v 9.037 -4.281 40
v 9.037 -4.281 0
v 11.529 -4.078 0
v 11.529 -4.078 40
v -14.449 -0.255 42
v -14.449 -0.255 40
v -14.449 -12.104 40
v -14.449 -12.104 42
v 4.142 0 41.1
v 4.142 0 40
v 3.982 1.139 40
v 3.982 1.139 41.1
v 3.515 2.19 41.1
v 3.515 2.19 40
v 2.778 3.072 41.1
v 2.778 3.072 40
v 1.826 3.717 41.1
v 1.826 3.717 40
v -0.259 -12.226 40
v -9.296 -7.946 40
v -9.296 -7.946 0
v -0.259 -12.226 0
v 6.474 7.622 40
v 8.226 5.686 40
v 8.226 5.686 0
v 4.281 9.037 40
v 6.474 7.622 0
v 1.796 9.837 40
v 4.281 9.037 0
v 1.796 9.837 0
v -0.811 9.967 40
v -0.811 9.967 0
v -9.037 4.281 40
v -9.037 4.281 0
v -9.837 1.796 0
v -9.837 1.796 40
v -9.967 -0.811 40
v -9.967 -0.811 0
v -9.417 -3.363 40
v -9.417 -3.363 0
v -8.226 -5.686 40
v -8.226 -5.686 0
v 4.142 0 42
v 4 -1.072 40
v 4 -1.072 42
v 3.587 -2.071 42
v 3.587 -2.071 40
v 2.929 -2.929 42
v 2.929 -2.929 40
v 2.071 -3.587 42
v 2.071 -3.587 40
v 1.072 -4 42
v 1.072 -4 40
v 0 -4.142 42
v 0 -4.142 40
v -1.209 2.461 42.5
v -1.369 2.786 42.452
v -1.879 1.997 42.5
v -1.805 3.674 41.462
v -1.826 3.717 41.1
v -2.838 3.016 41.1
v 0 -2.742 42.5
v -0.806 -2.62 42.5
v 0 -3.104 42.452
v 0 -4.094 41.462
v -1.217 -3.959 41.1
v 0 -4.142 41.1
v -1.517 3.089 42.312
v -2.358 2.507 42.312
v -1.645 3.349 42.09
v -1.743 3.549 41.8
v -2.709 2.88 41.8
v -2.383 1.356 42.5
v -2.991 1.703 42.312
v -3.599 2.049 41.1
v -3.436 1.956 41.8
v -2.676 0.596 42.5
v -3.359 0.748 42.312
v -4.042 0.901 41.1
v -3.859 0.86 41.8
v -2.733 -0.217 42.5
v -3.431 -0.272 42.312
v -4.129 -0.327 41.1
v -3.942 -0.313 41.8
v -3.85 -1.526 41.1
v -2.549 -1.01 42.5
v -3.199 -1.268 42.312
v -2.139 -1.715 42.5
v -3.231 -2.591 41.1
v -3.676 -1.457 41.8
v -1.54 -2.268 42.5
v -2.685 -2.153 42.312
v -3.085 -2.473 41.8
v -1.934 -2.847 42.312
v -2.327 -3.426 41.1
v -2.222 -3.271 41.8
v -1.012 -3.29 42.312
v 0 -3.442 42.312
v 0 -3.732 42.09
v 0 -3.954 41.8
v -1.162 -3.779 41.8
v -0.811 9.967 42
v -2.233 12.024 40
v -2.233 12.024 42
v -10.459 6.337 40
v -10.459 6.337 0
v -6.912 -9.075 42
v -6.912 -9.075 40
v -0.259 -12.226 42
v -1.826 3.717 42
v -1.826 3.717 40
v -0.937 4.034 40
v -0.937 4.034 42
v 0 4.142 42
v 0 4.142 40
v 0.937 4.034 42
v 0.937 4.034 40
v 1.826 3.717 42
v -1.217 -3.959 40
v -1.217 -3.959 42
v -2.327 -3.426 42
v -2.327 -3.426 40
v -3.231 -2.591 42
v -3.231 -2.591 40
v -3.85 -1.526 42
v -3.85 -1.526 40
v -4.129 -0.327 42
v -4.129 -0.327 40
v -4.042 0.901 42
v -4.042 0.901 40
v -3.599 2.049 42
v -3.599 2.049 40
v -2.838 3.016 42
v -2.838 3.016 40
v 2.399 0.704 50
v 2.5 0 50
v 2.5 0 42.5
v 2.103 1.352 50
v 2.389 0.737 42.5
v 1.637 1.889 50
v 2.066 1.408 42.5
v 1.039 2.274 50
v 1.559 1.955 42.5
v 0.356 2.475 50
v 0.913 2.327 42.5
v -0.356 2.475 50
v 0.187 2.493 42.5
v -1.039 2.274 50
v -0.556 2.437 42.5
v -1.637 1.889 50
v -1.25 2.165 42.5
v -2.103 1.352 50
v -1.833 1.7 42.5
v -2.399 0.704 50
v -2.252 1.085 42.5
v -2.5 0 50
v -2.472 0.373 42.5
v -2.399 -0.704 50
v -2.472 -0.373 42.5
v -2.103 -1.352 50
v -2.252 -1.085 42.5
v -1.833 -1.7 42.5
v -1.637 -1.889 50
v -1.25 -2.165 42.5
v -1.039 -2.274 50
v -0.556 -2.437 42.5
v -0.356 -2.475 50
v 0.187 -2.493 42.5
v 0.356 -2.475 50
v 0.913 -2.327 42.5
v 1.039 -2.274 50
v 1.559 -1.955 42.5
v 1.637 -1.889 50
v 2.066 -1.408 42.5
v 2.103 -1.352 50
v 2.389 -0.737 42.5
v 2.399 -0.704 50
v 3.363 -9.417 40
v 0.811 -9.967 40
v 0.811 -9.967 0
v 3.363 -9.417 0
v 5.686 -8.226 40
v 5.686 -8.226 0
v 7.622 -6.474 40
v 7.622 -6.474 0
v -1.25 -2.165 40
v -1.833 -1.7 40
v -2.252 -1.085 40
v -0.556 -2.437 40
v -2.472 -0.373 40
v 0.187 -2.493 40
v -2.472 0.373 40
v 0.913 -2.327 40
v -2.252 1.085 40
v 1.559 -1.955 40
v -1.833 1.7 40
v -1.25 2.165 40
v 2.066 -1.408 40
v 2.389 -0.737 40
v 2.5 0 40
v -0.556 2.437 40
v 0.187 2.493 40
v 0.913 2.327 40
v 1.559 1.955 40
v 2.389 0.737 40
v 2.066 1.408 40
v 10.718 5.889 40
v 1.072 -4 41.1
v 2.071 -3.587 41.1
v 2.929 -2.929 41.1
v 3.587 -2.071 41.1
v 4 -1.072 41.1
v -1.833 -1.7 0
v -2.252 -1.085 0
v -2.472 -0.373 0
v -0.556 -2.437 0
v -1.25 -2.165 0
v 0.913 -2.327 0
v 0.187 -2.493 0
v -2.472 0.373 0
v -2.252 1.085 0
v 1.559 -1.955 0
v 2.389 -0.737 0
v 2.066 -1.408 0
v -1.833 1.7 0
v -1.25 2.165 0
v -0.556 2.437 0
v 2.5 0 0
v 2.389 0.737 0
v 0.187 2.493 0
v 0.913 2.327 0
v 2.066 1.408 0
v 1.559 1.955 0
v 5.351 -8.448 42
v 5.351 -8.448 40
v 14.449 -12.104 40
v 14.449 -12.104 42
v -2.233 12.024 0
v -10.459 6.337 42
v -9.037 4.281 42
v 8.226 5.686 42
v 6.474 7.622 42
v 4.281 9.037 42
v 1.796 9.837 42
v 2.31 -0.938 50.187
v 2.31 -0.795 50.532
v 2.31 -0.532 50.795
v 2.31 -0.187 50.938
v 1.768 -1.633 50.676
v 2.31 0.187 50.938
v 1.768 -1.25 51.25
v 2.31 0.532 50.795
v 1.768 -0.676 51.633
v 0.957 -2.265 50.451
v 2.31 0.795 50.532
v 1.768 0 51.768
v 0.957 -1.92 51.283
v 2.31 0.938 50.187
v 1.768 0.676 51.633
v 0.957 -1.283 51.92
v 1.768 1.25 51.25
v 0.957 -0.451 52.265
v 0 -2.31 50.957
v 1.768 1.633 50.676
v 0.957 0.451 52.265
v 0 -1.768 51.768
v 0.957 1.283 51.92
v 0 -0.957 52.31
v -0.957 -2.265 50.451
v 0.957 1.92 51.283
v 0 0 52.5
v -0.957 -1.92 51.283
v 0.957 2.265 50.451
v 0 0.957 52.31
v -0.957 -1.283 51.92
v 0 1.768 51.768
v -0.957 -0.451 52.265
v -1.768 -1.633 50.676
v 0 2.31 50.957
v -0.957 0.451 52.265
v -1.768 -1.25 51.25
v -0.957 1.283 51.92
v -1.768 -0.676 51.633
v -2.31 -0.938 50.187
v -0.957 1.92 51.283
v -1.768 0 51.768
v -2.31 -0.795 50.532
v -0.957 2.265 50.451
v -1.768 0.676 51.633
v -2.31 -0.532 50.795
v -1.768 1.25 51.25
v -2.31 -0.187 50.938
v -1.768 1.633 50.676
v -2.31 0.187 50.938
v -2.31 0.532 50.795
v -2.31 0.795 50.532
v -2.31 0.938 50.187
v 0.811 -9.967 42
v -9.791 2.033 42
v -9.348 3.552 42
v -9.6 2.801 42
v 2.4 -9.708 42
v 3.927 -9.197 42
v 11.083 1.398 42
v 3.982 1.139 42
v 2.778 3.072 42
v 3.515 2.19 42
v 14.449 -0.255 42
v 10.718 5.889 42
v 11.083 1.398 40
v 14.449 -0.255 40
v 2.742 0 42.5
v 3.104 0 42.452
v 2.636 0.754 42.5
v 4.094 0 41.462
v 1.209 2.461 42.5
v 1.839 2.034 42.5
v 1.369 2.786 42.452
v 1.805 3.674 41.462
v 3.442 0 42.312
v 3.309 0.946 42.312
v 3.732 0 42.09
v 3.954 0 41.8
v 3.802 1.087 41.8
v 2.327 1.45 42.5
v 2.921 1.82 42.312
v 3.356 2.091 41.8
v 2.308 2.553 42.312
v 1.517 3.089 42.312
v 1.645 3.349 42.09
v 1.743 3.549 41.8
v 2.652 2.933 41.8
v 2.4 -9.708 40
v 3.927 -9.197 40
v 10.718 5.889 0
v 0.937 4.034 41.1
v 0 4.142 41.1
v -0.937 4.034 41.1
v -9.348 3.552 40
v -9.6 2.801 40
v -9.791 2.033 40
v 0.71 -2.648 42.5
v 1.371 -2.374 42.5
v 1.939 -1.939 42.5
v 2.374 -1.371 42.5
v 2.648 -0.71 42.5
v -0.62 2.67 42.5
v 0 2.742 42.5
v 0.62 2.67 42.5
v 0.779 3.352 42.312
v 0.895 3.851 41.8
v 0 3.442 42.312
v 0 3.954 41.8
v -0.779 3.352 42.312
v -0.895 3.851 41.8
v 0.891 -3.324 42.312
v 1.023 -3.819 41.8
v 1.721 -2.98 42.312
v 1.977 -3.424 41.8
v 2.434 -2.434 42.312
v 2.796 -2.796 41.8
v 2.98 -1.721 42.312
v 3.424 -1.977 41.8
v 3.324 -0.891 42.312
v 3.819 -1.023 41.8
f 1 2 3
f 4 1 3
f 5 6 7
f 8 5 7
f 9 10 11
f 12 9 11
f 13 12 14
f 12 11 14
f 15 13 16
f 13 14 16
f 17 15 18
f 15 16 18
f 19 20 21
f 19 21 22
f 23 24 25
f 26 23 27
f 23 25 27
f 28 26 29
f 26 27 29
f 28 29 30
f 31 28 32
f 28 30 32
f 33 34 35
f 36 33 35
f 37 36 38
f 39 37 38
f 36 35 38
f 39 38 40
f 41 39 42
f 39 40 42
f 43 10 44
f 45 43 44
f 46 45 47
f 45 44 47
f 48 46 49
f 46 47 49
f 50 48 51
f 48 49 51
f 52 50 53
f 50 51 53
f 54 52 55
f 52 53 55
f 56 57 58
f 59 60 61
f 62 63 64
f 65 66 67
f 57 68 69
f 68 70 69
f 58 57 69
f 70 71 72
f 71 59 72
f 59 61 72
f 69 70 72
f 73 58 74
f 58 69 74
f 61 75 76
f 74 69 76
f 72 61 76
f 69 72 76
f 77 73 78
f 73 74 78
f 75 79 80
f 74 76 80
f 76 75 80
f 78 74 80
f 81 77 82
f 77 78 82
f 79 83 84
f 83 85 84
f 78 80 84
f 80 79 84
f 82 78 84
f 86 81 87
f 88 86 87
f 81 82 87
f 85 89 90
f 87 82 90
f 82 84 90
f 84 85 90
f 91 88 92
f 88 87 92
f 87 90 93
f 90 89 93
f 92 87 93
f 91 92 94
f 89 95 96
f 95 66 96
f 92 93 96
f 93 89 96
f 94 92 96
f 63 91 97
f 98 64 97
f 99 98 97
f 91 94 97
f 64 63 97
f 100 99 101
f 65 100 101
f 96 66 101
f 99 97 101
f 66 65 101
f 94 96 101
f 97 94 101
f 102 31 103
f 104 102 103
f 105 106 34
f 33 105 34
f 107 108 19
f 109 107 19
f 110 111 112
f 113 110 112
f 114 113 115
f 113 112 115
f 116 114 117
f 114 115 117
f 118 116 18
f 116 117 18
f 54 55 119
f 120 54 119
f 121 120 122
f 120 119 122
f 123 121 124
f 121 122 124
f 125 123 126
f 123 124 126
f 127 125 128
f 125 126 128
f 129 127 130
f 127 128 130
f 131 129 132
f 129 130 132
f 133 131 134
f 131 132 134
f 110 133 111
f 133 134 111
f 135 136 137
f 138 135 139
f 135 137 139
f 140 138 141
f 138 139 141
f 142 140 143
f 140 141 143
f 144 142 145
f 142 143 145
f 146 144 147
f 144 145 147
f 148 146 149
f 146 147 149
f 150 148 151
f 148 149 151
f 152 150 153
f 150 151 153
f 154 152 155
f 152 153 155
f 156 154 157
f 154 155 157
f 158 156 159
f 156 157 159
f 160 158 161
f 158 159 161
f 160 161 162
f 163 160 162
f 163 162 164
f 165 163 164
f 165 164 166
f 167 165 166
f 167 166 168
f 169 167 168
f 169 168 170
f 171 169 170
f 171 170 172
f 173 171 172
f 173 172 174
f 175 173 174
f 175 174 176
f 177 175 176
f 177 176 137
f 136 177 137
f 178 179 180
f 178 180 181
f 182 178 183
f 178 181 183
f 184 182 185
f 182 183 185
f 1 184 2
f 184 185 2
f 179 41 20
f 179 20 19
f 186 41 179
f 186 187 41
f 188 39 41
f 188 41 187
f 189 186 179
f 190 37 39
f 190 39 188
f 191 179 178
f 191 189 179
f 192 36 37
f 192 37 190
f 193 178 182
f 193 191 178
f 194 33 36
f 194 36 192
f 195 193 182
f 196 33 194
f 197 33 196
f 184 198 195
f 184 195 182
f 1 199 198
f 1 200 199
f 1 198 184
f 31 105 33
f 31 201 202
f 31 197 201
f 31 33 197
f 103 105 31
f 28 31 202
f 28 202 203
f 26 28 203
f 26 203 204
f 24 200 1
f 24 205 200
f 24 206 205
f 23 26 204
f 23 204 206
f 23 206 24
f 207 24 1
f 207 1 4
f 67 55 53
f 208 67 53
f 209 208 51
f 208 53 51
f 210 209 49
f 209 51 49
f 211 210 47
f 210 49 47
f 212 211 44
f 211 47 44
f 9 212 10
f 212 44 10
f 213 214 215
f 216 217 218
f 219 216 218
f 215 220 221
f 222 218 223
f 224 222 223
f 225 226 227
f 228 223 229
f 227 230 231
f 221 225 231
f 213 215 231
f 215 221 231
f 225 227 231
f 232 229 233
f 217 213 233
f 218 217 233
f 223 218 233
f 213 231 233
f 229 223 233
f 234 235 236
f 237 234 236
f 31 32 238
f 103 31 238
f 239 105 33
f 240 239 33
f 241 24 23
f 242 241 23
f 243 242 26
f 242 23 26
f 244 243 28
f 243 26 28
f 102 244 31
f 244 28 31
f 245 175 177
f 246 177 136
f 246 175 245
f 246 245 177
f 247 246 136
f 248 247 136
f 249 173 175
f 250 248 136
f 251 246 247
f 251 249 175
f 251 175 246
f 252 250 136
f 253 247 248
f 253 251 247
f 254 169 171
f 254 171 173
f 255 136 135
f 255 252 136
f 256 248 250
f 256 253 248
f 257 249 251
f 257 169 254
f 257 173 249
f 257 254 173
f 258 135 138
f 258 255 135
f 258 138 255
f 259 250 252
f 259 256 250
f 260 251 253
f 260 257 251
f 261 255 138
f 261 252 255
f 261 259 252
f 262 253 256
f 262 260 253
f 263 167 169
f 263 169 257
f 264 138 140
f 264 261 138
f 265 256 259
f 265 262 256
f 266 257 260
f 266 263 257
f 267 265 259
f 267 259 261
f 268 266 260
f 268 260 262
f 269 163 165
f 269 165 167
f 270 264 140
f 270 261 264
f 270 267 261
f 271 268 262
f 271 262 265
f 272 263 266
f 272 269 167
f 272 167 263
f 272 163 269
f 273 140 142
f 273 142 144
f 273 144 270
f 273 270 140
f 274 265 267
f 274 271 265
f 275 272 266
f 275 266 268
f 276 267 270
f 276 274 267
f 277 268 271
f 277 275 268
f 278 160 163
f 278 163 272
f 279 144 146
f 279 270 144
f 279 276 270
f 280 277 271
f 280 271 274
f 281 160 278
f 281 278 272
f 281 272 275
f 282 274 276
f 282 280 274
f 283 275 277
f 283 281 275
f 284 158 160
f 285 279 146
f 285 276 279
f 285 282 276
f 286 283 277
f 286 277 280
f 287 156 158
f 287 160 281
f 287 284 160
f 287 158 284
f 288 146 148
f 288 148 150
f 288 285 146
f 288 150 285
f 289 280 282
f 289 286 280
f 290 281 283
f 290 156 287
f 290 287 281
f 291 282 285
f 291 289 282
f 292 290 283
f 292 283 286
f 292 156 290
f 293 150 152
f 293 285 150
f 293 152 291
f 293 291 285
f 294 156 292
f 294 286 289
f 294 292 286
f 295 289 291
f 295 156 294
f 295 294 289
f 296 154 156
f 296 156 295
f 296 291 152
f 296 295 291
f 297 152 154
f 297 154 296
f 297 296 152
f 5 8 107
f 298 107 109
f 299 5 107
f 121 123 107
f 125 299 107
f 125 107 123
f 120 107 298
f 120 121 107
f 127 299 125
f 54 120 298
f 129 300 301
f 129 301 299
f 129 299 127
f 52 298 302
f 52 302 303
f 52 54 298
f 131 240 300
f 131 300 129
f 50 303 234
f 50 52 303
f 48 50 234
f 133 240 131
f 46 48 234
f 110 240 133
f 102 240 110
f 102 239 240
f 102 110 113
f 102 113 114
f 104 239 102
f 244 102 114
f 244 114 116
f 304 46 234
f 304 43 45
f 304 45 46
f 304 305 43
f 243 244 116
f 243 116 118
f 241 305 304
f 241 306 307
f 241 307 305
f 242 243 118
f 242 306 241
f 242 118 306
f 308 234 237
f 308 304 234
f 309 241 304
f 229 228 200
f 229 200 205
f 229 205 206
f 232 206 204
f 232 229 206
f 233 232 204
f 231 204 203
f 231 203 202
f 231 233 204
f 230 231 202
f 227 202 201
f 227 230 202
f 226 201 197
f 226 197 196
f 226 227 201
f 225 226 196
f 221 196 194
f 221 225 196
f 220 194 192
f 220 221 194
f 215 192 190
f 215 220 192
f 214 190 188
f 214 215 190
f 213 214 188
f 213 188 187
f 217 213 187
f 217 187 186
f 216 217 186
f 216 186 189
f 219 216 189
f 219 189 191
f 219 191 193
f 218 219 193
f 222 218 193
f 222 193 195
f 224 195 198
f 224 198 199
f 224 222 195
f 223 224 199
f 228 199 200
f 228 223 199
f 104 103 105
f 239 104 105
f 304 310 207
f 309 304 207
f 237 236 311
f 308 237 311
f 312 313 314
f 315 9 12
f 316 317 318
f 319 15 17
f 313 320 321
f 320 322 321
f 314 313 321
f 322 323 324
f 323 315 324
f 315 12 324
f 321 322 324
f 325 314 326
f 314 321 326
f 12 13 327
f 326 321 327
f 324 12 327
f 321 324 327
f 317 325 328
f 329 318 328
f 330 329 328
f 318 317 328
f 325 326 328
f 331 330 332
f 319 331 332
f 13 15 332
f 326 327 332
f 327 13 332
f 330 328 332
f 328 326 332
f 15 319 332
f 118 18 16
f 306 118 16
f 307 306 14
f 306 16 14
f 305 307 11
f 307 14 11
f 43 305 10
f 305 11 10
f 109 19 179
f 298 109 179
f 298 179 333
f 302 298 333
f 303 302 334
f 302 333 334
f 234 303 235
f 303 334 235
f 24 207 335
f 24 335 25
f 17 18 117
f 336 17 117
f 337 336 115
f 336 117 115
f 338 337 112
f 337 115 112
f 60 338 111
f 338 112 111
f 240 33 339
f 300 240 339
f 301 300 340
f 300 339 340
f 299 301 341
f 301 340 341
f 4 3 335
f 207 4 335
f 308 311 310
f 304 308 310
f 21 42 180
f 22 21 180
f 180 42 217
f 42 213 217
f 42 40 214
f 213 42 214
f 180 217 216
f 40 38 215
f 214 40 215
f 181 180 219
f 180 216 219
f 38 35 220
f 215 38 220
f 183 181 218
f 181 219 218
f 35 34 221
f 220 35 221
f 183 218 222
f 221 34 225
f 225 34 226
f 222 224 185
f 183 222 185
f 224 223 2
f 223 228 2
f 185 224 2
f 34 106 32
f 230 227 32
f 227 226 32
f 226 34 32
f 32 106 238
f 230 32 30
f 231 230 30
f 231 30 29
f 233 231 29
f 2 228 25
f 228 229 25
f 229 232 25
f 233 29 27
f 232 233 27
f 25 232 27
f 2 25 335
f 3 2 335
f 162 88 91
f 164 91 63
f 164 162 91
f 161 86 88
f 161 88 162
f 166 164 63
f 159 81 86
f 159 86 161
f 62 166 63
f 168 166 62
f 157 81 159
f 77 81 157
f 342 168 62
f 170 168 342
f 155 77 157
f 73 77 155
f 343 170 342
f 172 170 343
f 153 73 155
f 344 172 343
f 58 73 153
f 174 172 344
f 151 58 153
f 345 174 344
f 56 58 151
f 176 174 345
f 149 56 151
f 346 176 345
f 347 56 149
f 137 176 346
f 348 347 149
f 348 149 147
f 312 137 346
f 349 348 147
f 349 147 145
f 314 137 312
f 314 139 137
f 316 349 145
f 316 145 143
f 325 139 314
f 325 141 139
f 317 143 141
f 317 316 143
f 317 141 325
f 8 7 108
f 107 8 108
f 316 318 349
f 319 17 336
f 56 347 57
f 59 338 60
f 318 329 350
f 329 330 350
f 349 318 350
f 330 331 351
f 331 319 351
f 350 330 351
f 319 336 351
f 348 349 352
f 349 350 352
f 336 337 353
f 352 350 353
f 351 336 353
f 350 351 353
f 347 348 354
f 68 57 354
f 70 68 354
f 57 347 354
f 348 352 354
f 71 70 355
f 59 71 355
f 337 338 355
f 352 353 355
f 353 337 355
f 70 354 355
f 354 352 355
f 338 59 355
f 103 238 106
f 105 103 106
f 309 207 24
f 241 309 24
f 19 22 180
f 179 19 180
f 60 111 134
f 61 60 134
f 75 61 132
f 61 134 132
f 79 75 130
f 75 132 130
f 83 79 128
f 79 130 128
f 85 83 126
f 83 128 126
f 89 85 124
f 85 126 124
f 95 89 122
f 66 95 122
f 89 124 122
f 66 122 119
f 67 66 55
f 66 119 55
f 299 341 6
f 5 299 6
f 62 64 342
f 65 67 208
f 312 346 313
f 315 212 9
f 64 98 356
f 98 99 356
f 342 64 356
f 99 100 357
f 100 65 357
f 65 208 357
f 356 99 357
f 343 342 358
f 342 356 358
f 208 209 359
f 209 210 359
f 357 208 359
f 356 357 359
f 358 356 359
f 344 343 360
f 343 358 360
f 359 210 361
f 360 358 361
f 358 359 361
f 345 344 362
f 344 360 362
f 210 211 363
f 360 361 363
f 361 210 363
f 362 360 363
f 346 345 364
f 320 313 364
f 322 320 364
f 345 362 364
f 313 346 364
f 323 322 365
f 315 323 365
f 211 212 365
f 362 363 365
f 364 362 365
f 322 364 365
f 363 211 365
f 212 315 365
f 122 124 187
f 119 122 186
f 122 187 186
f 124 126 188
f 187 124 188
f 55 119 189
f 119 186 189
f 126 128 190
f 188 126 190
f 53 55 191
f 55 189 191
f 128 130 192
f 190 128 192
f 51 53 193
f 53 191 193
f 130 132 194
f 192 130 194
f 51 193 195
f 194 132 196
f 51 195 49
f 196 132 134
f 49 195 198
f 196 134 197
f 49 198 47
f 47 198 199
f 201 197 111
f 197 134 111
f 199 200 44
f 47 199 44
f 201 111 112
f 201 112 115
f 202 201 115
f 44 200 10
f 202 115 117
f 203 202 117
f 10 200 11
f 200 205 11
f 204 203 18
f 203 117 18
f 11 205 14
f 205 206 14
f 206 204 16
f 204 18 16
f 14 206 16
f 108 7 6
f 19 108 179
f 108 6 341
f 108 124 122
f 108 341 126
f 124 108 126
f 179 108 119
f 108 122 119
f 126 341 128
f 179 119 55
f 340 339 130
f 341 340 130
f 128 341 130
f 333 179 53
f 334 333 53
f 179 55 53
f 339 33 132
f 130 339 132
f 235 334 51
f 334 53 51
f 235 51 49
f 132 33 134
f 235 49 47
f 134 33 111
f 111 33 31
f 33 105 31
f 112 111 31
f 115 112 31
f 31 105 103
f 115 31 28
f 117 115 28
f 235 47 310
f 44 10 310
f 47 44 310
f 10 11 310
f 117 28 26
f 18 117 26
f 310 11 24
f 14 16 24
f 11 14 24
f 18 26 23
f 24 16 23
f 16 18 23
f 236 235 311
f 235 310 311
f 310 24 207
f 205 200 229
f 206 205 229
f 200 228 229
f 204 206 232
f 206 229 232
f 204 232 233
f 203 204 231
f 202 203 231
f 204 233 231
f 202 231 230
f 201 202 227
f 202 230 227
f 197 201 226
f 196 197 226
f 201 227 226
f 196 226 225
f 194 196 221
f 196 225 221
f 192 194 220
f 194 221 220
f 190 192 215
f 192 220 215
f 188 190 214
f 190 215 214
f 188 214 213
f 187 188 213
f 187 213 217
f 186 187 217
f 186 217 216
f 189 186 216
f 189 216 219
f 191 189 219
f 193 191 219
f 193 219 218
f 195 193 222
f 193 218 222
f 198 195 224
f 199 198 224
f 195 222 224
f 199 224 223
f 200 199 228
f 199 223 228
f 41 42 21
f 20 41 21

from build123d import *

# Parameters (mm, degrees)
F0_R     = 2.5
F1_DEPTH = 40
F2_DEPTH = 40
F3_R     = 2.5
F4_DEPTH = 10
F5_DEPTH = 2.5
F8_R     = 1.4
F9_DEPTH = 2


with BuildPart() as f1:
    # F0 (on Top) → F1 (new body)
    with BuildSketch(Plane.XY):
        with BuildLine():
            ThreePointArc((9.0374170739, -4.2807817782), (9.7563869014, -2.1938355979), (10, 0))
            ThreePointArc((10, 0), (9.5461967047, 2.9782760912), (8.2259743049, 5.6862418815))
            ThreePointArc((8.2259743049, 5.6862418815), (4.2807817782, 9.0374170739), (-0.8114427689, 9.9670236597))
            Line((-0.8114427689, 9.9670236597), (-9.0374170739, 4.2807817782))
            ThreePointArc((-9.0374170739, 4.2807817782), (-9.9670236597, -0.8114427689), (-8.2259743049, -5.6862418815))
            ThreePointArc((-8.2259743049, -5.6862418815), (-4.2807817782, -9.0374170739), (0.8114427689, -9.9670236597))
            ThreePointArc((0.8114427689, -9.9670236597), (5.6862418815, -8.2259743049), (9.0374170739, -4.2807817782))
        make_face()
        Circle(F0_R, mode=Mode.SUBTRACT)
        with BuildLine():
            ThreePointArc((8.2259743049, 5.6862418815), (9.5461967047, 2.9782760912), (10, 0))
            ThreePointArc((10, 0), (9.7563869014, -2.1938355979), (9.0374170739, -4.2807817782))
            Line((9.0374170739, -4.2807817782), (11.5291729888, -4.077921086))
            Line((11.5291729888, -4.077921086), (10.7177302199, 5.8891025737))
            Line((10.7177302199, 5.8891025737), (8.2259743049, 5.6862418815))
        make_face()
        with BuildLine():
            Line((-9.0374170739, 4.2807817782), (-0.8114427689, 9.9670236597))
            ThreePointArc((-0.8114427689, 9.9670236597), (-5.6862418815, 8.2259743049), (-9.0374170739, 4.2807817782))
        make_face()
        with BuildLine():
            ThreePointArc((-9.0374170739, 4.2807817782), (-5.6862418815, 8.2259743049), (-0.8114427689, 9.9670236597))
            Line((-0.8114427689, 9.9670236597), (-2.2330032393, 12.0235172359))
            Line((-2.2330032393, 12.0235172359), (-10.4589775442, 6.3372753545))
            Line((-10.4589775442, 6.3372753545), (-9.0374170739, 4.2807817782))
        make_face()
        with BuildLine():
            Line((-0.2587526756, -12.2263779282), (0.8114427689, -9.9670236597))
            ThreePointArc((0.8114427689, -9.9670236597), (-4.2807817782, -9.0374170739), (-8.2259743049, -5.6862418815))
            Line((-8.2259743049, -5.6862418815), (-9.2961697495, -7.9455961499))
            Line((-9.2961697495, -7.9455961499), (-0.2587526756, -12.2263779282))
        make_face()
    extrude(amount=F1_DEPTH)


with BuildPart() as f2:
    # F0 (on Top) → F2 (new body)
    with BuildSketch(Plane.XY):
        Circle(F0_R)
    extrude(amount=F2_DEPTH)

    # F3 (on face) → F4 (join)
    with BuildSketch(Plane.XY.offset(40)):
        Circle(F3_R)
    extrude(amount=F4_DEPTH)

    # F3 (on face) → F5 (join)
    with BuildSketch(Plane.XY.offset(40)):
        with BuildLine():
            ThreePointArc((1.8260342345, 3.7172857004), (-2.93e-08, 4.1415714414), (-1.8260342871, 3.7172856746))
            ThreePointArc((-1.8260342871, 3.7172856746), (-4.0341057369, -0.9373392702), (0, -4.1415714414))
            ThreePointArc((0, -4.1415714414), (2.928533251, -2.928533251), (4.1415714414, 0))
            ThreePointArc((4.1415714414, 0), (3.5153424613, 2.1897445933), (1.8260342345, 3.7172857004))
        make_face()
        Circle(F3_R, mode=Mode.SUBTRACT)
    extrude(amount=F5_DEPTH)

    # F6 (on Front) → F7 (revolve)
    with BuildSketch(Plane.XZ):
        with BuildLine():
            Line((-2.5, 50), (2.5, 50))
            ThreePointArc((2.5, 50), (0, 52.5), (-2.5, 50))
        make_face()
    revolve(axis=Axis((0, 0, 50), (-1, 0, 0)))

    # F8
    f8_edges = [f2.edges().sort_by_distance(p)[0] for p in [
        (1.826034, -3.717286, 42.5),
    ]]
    fillet(f8_edges, radius=F8_R)


with BuildPart() as f9:
    # F3 (on face) → F9 (new body)
    with BuildSketch(Plane.XY.offset(40)):
        with BuildLine():
            Line((11.2723216959, -0.9229938236), (1.8260342345, 3.7172857004))
            ThreePointArc((1.8260342345, 3.7172857004), (3.5153424613, 2.1897445933), (4.1415714414, 0))
            ThreePointArc((4.1415714414, 0), (2.928533251, -2.928533251), (0, -4.1415714414))
            Line((0, -4.1415714414), (7.1333343578, -7.008248065))
            ThreePointArc((7.1333343578, -7.008248065), (8.1995773399, -5.7242406874), (9.0374170739, -4.2807817782))
            Line((9.0374170739, -4.2807817782), (11.5291729888, -4.077921086))
            Line((11.5291729888, -4.077921086), (11.2723216959, -0.9229938236))
        make_face()
        with BuildLine():
            Line((1.8260342345, 3.7172857004), (0, 4.6142845799))
            Line((0, 4.6142845799), (-1.8260342871, 3.7172856746))
            ThreePointArc((-1.8260342871, 3.7172856746), (-2.93e-08, 4.1415714414), (1.8260342345, 3.7172857004))
        make_face()
        with BuildLine():
            ThreePointArc((-8.2259743049, -5.6862418815), (-9.5010919758, -3.1191747736), (-9.9956228645, -0.2958437956))
            Line((-9.9956228645, -0.2958437956), (-14.4493776544, -2.4836522061))
            Line((-14.4493776544, -2.4836522061), (-14.4493776544, -9.9483500207))
            Line((-14.4493776544, -9.9483500207), (-9.2562886562, -7.861400764))
            Line((-9.2562886562, -7.861400764), (-8.2259743049, -5.6862418815))
        make_face()
        with BuildLine():
            ThreePointArc((0, -4.1415714414), (-4.0341057369, -0.9373392702), (-1.8260342871, 3.7172856746))
            Line((-1.8260342871, 3.7172856746), (-9.9956228645, -0.2958437956))
            ThreePointArc((-9.9956228645, -0.2958437956), (-9.5010919758, -3.1191747736), (-8.2259743049, -5.6862418815))
            Line((-8.2259743049, -5.6862418815), (-9.2562886562, -7.861400764))
            Line((-9.2562886562, -7.861400764), (0, -4.1415714414))
        make_face()
        with BuildLine():
            Line((14.4493776544, -2.4836522061), (11.2723216959, -0.9229938236))
            Line((11.2723216959, -0.9229938236), (11.5291729888, -4.077921086))
            Line((11.5291729888, -4.077921086), (9.0374170739, -4.2807817782))
            ThreePointArc((9.0374170739, -4.2807817782), (8.1995773399, -5.7242406874), (7.1333343578, -7.008248065))
            Line((7.1333343578, -7.008248065), (14.4493776544, -9.9483500207))
            Line((14.4493776544, -9.9483500207), (14.4493776544, -2.4836522061))
        make_face()
        with BuildLine():
            Line((-14.4493776544, -2.4836522061), (-9.9956228645, -0.2958437956))
            ThreePointArc((-9.9956228645, -0.2958437956), (-9.9616891791, 0.8744991134), (-9.7911952771, 2.0328539162))
            Line((-9.7911952771, 2.0328539162), (-14.4493776544, -0.2553750195))
            Line((-14.4493776544, -0.2553750195), (-14.4493776544, -2.4836522061))
        make_face()
        Polygon((11.0833543073, 1.398109408), (11.2723216959, -0.9229938236), (14.4493776544, -2.4836522061), (14.4493776544, -0.2553750195), align=None)
        with BuildLine():
            Line((14.4493776544, -9.9483500207), (7.1333343578, -7.008248065))
            ThreePointArc((7.1333343578, -7.008248065), (6.2837328899, -7.7791195497), (5.3514333814, -8.4476127258))
            Line((5.3514333814, -8.4476127258), (14.4493776544, -12.1038081124))
            Line((14.4493776544, -12.1038081124), (14.4493776544, -9.9483500207))
        make_face()
        Polygon((-9.2961697495, -7.9455961499), (-9.2562886562, -7.861400764), (-14.4493776544, -9.9483500207), (-14.4493776544, -12.1038081124), (-6.9121769502, -9.0748295195), align=None)
        with BuildLine():
            Line((-1.8260342871, 3.7172856746), (0, 4.6142845799))
            Line((0, 4.6142845799), (1.8260342345, 3.7172857004))
            Line((1.8260342345, 3.7172857004), (11.2723216959, -0.9229938236))
            Line((11.2723216959, -0.9229938236), (11.0833543073, 1.398109408))
            Line((11.0833543073, 1.398109408), (0, 6.8425617666))
            Line((0, 6.8425617666), (-9.7911952771, 2.0328539162))
            ThreePointArc((-9.7911952771, 2.0328539162), (-9.9616891791, 0.8744991134), (-9.9956228645, -0.2958437956))
            Line((-9.9956228645, -0.2958437956), (-1.8260342871, 3.7172856746))
        make_face()
        with BuildLine():
            Line((7.1333343578, -7.008248065), (0, -4.1415714414))
            Line((0, -4.1415714414), (-9.2562886562, -7.861400764))
            Line((-9.2562886562, -7.861400764), (-9.2961697495, -7.9455961499))
            Line((-9.2961697495, -7.9455961499), (-6.9121769502, -9.0748295195))
            Line((-6.9121769502, -9.0748295195), (-0.2587526756, -12.2263779282))
            Line((-0.2587526756, -12.2263779282), (0.8114427689, -9.9670236597))
            ThreePointArc((0.8114427689, -9.9670236597), (3.1737065093, -9.4830157119), (5.3514333814, -8.4476127258))
            ThreePointArc((5.3514333814, -8.4476127258), (6.2837328899, -7.7791195497), (7.1333343578, -7.008248065))
        make_face()
        with BuildLine():
            ThreePointArc((-9.0374170739, 4.2807817782), (-9.4811632031, 3.1792364359), (-9.7911952771, 2.0328539162))
            Line((-9.7911952771, 2.0328539162), (0, 6.8425617666))
            Line((0, 6.8425617666), (11.0833543073, 1.398109408))
            Line((11.0833543073, 1.398109408), (10.7177302199, 5.8891025737))
            Line((10.7177302199, 5.8891025737), (8.2259743049, 5.6862418815))
            ThreePointArc((8.2259743049, 5.6862418815), (4.2807817782, 9.0374170739), (-0.8114427689, 9.9670236597))
            Line((-0.8114427689, 9.9670236597), (-2.2330032393, 12.0235172359))
            Line((-2.2330032393, 12.0235172359), (-10.4589775442, 6.3372753545))
            Line((-10.4589775442, 6.3372753545), (-9.0374170739, 4.2807817782))
        make_face()
    extrude(amount=F9_DEPTH)


solid = Compound([f1.part, f2.part, f9.part])
